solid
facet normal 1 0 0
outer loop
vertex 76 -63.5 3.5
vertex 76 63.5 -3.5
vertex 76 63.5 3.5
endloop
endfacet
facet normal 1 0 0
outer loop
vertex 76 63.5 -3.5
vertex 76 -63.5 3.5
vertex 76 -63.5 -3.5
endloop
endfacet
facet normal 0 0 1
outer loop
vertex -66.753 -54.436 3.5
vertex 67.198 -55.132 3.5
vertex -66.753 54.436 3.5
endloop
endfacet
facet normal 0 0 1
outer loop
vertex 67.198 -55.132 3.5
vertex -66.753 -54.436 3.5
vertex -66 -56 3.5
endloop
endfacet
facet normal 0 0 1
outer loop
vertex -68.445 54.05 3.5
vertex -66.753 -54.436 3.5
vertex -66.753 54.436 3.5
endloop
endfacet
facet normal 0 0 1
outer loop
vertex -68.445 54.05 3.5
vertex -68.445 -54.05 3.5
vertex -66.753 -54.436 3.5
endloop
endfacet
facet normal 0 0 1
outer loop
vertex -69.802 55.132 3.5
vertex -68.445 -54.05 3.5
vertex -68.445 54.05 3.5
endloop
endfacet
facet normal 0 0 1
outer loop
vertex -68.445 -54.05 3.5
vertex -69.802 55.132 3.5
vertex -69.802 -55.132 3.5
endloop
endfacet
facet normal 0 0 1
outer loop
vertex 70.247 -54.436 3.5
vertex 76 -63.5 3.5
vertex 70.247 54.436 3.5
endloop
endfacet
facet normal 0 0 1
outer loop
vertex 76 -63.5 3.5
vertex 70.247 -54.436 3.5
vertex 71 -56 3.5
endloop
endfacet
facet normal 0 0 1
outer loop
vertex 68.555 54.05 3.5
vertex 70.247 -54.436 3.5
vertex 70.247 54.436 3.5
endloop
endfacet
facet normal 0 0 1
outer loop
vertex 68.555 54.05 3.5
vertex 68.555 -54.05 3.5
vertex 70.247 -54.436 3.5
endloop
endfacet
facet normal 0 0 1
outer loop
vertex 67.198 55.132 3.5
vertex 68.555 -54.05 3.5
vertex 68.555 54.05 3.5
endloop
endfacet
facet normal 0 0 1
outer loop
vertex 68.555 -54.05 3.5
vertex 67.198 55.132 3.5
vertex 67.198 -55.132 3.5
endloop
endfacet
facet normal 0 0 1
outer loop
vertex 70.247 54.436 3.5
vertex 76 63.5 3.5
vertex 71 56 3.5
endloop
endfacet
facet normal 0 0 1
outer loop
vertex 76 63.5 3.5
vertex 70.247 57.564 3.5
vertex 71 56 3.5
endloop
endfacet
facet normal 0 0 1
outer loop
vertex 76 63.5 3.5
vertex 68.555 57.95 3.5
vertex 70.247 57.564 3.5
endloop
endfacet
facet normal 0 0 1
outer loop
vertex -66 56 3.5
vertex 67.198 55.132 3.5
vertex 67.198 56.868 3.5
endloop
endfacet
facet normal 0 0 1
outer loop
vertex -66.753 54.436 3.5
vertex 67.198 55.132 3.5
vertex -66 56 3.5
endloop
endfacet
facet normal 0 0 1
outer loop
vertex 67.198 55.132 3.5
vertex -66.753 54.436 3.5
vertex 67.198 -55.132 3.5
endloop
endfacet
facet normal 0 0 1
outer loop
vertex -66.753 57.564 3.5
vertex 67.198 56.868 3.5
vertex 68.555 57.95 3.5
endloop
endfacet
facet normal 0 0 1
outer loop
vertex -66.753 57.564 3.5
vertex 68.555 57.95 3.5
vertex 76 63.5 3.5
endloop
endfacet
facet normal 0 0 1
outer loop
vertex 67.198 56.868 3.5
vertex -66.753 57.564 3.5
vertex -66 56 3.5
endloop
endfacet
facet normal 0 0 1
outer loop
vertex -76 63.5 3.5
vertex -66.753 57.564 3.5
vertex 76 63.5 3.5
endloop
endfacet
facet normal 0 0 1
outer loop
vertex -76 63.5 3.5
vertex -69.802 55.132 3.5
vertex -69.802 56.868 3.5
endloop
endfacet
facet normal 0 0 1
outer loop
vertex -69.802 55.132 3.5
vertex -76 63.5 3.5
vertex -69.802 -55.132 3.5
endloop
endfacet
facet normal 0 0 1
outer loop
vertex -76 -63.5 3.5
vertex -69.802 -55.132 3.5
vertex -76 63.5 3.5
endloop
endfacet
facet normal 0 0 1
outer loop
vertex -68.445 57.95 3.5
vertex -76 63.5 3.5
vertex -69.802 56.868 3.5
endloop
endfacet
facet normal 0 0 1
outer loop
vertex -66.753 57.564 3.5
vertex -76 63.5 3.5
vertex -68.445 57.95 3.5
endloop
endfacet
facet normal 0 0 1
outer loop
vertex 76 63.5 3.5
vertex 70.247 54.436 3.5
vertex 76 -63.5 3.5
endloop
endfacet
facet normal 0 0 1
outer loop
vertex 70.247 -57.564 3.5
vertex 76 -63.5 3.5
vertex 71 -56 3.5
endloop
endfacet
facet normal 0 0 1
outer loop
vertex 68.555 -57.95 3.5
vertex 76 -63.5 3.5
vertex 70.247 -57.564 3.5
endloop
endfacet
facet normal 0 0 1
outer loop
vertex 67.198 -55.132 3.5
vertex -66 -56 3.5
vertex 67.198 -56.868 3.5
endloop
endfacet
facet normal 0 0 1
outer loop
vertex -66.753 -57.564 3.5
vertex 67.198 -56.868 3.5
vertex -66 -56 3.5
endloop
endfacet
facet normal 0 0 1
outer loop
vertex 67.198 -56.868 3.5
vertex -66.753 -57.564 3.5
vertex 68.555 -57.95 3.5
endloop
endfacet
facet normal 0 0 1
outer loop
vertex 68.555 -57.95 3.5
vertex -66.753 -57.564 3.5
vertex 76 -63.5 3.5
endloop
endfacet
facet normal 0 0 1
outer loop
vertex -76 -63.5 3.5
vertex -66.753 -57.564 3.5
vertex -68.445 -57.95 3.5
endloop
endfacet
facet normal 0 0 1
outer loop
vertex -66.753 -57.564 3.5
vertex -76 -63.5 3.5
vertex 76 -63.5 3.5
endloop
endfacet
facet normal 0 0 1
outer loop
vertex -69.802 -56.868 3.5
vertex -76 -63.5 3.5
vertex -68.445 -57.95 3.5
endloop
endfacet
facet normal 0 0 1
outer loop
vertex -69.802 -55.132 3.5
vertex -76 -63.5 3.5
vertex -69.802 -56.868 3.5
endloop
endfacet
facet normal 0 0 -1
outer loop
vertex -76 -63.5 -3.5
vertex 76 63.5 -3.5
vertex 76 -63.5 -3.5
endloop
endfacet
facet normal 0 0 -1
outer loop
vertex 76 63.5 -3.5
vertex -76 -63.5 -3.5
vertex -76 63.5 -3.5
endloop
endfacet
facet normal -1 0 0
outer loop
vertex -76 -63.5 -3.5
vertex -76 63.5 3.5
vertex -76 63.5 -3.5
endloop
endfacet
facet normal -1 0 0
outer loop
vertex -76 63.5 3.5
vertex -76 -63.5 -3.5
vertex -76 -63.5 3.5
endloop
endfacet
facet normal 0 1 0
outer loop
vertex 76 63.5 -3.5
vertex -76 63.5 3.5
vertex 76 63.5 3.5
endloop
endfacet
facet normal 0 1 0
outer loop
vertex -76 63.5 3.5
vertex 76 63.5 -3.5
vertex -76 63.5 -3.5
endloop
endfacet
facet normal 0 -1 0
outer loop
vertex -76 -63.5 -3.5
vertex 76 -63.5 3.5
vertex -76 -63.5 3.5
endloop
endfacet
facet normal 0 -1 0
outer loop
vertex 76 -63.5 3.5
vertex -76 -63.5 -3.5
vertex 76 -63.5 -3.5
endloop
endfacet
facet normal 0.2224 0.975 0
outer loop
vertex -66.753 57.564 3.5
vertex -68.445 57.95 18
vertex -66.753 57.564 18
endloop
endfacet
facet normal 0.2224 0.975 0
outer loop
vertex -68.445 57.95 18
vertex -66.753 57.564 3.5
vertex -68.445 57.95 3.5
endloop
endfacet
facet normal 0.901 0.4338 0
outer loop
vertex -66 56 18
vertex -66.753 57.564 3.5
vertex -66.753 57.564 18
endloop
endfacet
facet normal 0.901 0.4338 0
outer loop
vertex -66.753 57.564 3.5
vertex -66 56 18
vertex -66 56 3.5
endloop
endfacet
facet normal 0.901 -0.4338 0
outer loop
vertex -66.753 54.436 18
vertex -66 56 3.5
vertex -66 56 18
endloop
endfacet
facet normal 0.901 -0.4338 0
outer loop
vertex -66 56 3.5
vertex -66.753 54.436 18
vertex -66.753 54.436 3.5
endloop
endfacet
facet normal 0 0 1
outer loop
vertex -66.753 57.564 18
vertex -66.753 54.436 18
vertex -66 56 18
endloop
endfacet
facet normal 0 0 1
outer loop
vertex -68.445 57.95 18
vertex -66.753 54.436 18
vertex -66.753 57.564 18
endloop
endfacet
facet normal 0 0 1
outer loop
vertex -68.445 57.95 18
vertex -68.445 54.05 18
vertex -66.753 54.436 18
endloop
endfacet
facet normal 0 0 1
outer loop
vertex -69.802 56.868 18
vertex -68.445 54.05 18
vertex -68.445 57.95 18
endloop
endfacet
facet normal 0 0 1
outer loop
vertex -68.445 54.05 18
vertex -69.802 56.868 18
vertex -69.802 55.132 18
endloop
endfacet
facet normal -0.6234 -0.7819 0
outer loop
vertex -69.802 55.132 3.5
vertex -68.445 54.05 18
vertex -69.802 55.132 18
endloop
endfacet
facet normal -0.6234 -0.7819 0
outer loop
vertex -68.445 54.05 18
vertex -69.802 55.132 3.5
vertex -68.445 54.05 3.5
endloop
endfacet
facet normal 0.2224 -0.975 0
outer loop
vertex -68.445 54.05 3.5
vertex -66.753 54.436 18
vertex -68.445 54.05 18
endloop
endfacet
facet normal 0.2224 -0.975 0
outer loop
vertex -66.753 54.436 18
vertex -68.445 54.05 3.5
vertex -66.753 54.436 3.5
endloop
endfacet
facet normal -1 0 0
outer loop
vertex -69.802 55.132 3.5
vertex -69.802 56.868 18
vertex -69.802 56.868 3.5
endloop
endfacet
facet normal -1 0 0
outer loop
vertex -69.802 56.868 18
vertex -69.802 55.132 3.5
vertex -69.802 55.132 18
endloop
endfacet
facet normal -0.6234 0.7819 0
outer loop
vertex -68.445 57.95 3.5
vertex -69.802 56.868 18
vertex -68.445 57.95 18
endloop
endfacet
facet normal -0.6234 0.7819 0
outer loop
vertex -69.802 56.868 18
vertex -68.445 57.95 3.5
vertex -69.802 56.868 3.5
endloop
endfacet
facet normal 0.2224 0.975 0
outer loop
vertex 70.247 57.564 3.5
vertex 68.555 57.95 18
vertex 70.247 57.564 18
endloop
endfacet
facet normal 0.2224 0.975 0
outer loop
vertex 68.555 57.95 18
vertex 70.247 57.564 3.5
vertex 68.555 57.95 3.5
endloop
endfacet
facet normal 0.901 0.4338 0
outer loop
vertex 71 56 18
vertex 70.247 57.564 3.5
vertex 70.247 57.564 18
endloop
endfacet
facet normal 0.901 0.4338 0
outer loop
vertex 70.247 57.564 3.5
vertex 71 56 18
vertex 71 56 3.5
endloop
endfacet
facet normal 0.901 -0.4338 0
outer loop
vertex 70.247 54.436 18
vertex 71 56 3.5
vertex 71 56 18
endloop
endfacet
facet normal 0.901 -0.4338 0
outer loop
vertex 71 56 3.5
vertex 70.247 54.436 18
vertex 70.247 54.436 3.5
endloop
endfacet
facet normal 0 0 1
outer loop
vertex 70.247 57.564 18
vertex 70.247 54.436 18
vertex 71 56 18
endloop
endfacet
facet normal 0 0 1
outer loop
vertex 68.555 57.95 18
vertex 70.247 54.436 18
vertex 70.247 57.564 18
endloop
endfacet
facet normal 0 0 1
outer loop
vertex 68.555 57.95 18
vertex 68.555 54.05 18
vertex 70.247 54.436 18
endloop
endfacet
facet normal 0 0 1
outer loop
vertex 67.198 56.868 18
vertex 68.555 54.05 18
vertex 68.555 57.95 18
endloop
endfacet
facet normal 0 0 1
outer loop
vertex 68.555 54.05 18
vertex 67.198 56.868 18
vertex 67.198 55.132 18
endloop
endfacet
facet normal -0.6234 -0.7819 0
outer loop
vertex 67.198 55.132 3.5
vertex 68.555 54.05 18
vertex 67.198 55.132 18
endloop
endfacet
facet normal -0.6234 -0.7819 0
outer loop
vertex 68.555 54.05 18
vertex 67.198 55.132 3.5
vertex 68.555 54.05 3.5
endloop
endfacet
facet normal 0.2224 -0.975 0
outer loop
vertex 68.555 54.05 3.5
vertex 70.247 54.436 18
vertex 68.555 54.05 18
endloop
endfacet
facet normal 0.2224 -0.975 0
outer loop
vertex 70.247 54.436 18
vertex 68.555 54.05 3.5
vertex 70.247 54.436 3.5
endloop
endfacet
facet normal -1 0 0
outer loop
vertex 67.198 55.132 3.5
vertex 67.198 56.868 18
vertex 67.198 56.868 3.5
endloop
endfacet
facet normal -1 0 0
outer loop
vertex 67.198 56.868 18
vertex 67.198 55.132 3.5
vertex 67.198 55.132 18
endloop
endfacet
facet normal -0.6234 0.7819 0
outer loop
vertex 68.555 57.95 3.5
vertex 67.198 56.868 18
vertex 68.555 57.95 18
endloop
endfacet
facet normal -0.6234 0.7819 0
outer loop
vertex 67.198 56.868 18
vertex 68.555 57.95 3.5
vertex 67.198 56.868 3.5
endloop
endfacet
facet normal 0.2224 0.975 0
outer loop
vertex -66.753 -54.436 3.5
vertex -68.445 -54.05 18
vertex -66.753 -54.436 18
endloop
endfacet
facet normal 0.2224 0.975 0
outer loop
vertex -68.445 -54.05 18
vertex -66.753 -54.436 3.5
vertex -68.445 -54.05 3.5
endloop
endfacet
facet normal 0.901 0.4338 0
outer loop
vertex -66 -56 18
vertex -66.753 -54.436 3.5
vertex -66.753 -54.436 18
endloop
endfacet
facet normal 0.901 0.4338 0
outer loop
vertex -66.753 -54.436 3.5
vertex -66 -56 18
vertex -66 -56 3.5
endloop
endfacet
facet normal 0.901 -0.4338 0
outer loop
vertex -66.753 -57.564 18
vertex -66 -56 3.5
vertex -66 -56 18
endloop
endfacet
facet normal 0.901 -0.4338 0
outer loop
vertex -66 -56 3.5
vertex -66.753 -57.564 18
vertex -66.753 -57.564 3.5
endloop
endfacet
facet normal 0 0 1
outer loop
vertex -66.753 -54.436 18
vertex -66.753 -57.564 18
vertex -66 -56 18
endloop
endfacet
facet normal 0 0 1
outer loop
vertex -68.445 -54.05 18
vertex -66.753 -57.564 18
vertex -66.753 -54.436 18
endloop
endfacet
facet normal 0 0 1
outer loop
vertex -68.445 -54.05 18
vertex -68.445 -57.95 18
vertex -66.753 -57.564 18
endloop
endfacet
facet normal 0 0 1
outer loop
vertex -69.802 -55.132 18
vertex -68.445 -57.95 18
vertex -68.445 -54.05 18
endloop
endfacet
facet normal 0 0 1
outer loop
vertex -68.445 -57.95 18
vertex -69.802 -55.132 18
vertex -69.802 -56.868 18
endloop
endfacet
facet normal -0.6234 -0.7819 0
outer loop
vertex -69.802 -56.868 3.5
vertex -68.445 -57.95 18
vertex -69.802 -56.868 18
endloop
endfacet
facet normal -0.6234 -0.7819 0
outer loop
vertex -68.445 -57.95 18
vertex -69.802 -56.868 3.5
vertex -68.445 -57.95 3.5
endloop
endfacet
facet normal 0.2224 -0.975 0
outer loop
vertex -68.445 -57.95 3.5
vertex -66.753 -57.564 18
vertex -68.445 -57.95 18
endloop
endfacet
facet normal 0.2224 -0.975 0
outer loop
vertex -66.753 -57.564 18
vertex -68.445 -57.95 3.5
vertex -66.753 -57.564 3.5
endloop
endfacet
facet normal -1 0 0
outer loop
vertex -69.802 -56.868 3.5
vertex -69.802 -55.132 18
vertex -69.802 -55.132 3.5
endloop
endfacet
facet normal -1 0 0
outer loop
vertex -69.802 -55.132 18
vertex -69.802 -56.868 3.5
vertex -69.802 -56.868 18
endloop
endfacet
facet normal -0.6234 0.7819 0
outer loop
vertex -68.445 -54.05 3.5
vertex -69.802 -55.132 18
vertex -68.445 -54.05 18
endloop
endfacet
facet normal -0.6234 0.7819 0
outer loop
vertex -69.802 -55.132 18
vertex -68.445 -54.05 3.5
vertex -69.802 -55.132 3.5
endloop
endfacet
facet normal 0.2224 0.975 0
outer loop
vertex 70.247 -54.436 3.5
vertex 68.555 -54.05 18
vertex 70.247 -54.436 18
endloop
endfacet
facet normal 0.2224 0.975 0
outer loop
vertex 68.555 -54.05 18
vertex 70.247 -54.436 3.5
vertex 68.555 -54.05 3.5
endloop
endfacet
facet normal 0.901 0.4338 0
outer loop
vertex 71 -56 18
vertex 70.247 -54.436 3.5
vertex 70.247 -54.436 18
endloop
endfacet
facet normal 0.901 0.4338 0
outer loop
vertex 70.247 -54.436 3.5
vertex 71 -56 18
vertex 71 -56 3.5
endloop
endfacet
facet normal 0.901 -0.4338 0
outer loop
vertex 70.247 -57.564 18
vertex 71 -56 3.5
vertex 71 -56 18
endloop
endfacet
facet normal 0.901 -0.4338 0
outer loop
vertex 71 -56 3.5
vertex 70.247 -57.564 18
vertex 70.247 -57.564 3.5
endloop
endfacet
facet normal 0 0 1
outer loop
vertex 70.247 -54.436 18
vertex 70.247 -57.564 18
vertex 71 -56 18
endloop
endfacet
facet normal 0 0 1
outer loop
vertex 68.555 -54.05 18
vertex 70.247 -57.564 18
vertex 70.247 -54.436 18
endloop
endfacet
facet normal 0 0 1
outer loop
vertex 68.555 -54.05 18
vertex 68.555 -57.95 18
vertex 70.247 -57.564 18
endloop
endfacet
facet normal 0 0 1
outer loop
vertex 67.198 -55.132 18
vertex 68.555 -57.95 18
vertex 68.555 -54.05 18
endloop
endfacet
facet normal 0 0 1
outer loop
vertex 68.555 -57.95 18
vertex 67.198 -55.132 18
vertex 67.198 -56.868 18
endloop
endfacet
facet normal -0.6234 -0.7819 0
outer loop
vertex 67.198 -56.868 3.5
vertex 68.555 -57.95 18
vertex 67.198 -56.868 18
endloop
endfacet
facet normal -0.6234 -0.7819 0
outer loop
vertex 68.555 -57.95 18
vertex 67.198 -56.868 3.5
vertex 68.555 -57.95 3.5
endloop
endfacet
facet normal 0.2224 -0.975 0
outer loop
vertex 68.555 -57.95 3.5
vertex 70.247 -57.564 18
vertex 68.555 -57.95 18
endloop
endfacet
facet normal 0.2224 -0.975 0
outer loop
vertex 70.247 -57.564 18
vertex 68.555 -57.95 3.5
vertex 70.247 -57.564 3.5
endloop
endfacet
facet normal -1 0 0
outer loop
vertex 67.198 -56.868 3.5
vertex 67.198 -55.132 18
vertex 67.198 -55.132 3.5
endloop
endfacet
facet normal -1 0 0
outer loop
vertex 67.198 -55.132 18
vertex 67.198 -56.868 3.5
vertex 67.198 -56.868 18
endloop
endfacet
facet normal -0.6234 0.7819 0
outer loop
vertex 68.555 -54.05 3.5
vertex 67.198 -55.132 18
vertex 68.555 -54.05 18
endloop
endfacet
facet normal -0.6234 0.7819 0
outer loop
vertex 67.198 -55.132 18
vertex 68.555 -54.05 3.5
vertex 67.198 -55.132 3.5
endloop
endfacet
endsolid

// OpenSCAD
bLength = 152;
bWidth = 127;
bHeight = 7;

supHoles = 2;
supHolesHeight = 15;

union(){

cube([bLength,bWidth,bHeight],center = true);

translate([-68,56,3])cylinder(supHolesHeight,supHoles,supHoles);
translate([69,56,3])cylinder(supHolesHeight,supHoles,supHoles);
translate([-68,-56,3])cylinder(supHolesHeight,supHoles,supHoles);
translate([69,-56,3])cylinder(supHolesHeight,supHoles,supHoles);

}
